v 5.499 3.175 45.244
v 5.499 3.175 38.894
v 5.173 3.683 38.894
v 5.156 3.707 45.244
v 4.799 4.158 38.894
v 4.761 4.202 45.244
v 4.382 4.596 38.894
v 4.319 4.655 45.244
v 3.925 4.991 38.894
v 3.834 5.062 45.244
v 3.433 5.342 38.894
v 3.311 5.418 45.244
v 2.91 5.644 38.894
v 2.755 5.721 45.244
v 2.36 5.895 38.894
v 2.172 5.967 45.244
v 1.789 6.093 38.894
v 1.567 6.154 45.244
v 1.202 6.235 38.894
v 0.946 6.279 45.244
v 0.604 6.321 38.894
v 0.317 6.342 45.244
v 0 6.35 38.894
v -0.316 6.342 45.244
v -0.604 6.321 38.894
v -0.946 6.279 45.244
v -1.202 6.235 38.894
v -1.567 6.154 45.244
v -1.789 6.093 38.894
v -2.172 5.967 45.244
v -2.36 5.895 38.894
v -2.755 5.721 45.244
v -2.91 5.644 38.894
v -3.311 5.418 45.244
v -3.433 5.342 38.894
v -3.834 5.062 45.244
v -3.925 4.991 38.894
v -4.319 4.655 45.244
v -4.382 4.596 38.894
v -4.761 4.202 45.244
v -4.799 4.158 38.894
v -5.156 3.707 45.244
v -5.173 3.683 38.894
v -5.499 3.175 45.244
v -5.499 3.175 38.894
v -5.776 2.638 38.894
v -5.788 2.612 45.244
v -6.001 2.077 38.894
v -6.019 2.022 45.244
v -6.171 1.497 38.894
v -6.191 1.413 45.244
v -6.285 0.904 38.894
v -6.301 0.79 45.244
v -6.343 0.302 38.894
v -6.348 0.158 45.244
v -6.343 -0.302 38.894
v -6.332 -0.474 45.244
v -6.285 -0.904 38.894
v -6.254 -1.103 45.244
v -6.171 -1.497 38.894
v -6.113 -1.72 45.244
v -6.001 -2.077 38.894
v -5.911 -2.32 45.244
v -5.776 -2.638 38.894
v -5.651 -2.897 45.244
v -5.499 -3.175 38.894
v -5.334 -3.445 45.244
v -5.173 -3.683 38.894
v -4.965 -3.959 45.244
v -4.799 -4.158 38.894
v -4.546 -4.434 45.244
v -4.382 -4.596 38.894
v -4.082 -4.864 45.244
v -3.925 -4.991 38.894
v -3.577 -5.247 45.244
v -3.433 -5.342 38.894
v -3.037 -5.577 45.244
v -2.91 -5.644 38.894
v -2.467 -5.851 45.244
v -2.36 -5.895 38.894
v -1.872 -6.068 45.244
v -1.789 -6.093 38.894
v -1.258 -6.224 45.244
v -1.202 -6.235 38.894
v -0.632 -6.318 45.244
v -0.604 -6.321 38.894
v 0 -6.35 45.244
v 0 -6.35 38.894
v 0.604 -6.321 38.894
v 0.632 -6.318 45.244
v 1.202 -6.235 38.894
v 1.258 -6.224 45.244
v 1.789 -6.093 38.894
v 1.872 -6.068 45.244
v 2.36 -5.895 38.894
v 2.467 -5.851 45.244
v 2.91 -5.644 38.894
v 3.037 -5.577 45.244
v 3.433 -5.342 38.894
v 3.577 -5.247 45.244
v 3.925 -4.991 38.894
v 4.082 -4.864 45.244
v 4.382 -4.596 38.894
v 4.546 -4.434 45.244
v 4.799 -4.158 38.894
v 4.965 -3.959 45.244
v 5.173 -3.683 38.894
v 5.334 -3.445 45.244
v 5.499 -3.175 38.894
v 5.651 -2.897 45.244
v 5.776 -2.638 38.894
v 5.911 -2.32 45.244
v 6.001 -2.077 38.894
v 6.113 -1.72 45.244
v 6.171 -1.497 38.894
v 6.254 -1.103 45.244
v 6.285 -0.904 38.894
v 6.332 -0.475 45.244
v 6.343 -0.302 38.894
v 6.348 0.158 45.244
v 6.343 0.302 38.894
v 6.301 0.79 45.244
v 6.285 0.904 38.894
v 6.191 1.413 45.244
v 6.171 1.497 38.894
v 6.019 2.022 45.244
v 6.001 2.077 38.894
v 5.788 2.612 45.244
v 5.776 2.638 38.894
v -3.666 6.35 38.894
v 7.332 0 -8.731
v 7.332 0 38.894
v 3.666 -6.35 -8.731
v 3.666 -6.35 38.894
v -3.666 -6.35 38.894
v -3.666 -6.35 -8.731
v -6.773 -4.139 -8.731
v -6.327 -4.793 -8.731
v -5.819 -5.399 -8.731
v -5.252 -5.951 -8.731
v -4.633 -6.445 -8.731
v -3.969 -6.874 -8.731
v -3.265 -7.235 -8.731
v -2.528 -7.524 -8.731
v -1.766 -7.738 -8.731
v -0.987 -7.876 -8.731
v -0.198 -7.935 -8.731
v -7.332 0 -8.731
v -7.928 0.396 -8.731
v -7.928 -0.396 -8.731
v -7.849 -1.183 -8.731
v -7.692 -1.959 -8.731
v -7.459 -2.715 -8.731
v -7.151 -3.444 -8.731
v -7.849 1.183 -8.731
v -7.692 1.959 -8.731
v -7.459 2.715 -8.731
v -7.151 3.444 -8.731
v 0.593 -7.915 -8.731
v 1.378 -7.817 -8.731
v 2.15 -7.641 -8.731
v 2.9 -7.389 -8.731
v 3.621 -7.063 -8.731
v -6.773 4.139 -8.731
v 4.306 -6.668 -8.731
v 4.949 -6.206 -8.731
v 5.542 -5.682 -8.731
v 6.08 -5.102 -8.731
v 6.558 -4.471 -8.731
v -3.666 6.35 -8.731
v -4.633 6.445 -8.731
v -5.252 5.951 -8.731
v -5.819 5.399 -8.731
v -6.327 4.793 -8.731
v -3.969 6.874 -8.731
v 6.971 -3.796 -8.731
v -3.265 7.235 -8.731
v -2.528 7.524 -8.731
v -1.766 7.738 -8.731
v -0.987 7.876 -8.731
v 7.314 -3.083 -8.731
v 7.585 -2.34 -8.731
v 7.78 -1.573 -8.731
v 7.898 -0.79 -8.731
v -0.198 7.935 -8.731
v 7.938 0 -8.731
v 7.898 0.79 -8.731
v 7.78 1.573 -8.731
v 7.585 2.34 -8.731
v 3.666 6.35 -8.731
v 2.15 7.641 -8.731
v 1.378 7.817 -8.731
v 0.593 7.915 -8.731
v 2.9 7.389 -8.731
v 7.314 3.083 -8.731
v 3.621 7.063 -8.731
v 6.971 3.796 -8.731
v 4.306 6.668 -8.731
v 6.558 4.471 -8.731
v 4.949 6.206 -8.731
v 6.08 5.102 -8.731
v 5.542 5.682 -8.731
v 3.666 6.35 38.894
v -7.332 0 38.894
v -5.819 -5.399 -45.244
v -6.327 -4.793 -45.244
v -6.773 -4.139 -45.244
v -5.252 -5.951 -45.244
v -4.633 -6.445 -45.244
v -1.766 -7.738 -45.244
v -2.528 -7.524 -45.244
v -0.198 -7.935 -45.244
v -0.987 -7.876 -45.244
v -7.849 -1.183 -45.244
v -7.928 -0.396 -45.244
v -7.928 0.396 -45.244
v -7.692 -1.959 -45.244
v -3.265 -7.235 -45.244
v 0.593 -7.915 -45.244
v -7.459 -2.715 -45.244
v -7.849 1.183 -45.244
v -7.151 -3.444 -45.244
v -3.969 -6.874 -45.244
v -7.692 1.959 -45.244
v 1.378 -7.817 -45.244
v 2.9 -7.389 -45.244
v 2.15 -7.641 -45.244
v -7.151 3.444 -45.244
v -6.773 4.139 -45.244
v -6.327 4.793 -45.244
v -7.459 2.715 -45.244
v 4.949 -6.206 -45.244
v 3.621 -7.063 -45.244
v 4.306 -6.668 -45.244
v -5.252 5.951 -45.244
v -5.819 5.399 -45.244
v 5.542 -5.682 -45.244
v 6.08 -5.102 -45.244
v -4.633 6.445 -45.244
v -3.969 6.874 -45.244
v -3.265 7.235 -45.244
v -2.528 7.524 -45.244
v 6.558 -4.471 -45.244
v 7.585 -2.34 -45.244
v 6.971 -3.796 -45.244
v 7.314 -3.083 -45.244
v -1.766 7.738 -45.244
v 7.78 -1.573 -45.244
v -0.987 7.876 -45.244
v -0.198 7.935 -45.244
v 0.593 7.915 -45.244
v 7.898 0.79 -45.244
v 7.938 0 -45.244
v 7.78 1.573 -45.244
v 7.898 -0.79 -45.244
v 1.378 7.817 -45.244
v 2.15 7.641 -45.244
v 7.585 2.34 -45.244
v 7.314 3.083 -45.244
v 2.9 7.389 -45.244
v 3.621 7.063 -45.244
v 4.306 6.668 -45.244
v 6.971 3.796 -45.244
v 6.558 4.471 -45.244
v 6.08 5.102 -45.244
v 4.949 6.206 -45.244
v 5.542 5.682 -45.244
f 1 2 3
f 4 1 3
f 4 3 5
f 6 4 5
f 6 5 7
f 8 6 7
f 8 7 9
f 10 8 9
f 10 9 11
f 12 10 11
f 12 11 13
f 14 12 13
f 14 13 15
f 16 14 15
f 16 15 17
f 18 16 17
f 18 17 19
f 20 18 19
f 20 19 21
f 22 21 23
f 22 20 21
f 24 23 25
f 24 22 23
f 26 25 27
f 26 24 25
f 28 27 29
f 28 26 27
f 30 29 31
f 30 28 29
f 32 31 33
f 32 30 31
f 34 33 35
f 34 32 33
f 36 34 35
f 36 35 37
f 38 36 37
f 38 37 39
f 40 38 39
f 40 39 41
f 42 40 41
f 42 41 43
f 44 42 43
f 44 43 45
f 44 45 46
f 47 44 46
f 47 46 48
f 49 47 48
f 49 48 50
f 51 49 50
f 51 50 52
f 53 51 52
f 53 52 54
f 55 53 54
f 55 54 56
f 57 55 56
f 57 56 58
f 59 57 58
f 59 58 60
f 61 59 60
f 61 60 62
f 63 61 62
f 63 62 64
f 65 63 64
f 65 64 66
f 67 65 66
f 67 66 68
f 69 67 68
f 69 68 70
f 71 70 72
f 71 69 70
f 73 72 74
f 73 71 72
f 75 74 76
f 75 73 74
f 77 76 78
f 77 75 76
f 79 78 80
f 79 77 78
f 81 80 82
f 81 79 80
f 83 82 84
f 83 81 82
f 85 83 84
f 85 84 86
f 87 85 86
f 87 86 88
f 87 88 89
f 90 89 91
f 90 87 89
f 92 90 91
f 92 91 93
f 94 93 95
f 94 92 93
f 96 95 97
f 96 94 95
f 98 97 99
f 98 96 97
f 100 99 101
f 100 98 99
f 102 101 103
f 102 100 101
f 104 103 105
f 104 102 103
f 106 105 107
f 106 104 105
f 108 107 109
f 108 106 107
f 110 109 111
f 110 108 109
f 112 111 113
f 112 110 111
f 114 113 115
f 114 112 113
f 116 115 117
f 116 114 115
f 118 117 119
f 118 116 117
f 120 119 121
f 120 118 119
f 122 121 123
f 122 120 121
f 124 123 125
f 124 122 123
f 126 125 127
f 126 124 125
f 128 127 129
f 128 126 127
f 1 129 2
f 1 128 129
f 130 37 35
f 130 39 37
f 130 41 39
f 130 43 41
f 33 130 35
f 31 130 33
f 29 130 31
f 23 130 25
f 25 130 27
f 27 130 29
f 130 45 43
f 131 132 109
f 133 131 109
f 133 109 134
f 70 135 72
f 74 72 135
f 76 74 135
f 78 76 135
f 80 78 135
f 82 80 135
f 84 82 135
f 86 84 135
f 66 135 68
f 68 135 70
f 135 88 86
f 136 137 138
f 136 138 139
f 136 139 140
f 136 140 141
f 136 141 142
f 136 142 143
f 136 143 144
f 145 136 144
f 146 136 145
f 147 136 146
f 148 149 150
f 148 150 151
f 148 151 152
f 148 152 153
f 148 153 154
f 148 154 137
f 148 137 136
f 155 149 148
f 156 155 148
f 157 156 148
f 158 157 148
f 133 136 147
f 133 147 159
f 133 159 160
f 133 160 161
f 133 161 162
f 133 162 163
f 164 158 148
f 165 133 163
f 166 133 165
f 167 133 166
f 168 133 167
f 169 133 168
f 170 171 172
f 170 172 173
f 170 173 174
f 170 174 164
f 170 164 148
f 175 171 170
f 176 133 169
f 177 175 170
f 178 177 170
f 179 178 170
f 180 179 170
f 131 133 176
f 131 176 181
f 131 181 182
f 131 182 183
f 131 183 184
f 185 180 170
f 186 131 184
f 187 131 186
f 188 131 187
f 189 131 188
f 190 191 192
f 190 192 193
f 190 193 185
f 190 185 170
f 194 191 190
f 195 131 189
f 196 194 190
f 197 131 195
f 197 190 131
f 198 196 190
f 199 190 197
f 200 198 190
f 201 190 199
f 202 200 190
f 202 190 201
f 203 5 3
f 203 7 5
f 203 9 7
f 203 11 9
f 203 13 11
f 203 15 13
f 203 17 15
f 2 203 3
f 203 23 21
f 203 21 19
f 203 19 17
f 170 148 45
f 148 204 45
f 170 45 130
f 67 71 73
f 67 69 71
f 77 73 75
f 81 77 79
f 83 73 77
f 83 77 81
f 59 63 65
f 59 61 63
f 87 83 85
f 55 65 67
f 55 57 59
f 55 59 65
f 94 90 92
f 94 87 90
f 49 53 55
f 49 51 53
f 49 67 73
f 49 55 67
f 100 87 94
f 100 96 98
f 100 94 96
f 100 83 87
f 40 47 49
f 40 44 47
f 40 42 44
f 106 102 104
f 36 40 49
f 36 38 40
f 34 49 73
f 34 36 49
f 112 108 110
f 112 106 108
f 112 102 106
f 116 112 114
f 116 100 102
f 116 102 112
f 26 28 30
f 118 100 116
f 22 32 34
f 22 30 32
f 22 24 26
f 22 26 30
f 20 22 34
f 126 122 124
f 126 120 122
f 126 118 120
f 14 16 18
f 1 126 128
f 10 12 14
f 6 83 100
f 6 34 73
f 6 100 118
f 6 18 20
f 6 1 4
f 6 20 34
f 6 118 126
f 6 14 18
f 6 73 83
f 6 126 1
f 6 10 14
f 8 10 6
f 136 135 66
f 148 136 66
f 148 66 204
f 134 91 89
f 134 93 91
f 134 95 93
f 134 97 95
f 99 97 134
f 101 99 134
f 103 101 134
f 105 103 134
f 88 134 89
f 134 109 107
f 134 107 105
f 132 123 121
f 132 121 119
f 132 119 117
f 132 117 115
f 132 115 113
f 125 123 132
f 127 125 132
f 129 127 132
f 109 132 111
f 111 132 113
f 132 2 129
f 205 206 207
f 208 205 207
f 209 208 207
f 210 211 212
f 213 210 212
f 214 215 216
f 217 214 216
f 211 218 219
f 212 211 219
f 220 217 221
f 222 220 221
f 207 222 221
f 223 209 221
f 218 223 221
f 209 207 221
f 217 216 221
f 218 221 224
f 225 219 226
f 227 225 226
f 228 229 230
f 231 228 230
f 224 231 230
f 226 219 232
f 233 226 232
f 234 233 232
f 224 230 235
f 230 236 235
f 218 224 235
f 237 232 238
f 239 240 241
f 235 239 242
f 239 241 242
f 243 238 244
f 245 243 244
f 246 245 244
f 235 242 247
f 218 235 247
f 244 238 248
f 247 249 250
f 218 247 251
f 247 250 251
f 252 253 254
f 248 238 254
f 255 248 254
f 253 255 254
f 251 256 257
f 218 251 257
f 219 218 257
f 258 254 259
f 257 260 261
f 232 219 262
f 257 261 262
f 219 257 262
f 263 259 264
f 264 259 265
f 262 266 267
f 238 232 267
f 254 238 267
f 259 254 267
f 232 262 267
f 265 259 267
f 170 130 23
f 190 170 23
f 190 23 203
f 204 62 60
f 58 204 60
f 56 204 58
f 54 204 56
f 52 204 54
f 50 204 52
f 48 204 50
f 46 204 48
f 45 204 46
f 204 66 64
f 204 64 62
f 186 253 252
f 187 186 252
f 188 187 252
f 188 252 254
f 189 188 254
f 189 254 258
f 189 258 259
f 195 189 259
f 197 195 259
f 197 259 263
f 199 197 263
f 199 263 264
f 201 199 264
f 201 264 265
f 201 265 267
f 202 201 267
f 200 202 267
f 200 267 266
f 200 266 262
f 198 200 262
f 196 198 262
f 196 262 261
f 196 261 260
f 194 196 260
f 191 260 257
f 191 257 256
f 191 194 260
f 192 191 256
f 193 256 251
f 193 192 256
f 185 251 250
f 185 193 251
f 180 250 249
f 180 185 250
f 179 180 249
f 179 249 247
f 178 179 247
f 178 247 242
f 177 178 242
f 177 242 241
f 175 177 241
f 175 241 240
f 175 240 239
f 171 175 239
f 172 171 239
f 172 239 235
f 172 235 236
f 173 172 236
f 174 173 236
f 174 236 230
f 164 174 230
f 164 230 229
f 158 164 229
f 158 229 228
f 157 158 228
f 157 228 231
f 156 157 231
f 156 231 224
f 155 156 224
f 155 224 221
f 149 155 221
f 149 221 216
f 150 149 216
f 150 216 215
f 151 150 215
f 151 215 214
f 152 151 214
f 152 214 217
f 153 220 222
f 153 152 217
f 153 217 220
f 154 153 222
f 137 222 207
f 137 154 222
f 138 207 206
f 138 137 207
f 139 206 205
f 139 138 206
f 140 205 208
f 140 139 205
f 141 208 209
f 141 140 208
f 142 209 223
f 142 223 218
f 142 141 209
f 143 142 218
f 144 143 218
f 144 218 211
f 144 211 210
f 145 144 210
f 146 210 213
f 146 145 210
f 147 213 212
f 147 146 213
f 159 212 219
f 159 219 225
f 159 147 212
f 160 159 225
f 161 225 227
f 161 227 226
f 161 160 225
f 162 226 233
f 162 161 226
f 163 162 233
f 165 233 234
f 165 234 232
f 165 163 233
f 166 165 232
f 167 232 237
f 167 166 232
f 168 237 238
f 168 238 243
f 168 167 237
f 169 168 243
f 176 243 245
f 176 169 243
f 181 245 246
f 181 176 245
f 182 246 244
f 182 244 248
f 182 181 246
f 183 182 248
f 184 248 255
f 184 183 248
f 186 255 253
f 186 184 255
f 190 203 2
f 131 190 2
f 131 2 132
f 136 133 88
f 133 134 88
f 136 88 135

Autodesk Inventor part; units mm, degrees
ref_plane "YZ Plane" through (0, 0, 0) normal (1, 0, 0) x (0, 1, 0)
ref_plane "XZ Plane" through (0, 0, 0) normal (0, 1, 0) x (-1, 0, 0)
ref_plane "XY Plane" through (0, 0, 0) normal (0, 0, 1) x (1, 0, 0)
sketch "Sketch1" plane through (0, 0, 0) normal (0, 0, 1) x (1, 0, 0)
  circle A0 centre (0, 0) radius 7.9375
  dimension "d0" = 15.875
extrude "Extrusion1" add sketch "Sketch1" along normal mid plane 90.4875
sketch "Sketch2" plane through (0, 0, 45.2437) normal (0, 0, 1) x (1, 0, 0)
  line L0 (-3.6662, 6.35) -> (3.6662, 6.35)
  line L1 (3.6662, 6.35) -> (7.3323, 0)
  line L2 (7.3323, 0) -> (3.6662, -6.35)
  line L3 (3.6662, -6.35) -> (-3.6662, -6.35)
  line L4 (-3.6662, -6.35) -> (-7.3323, 0)
  line L5 (-7.3323, 0) -> (-3.6662, 6.35)
  circle A0 centre (0, 0) radius 7.9375 projected
  point P0 (0, -6.35)
  point P1 (0, 6.35)
  dimension "d3" = 12.7
extrude "Extrusion2" cut sketch "Sketch2" against normal blind 53.975
sketch "Sketch3" plane through (0, 0, 45.2437) normal (0, 0, 1) x (1, 0, 0)
  circle A0 centre (0, 0) radius 6.35
  circle A1 centre (0, 0) radius 7.9375 projected
  line L0 (3.6662, 6.35) -> (-3.6662, 6.35) projected
  line L1 (7.3323, 0) -> (3.6662, 6.35) projected
  line L2 (3.6662, -6.35) -> (7.3323, 0) projected
  line L3 (-3.6662, -6.35) -> (3.6662, -6.35) projected
  line L4 (-7.3323, 0) -> (-3.6662, -6.35) projected
  line L5 (-3.6662, 6.35) -> (-7.3323, 0) projected
  point P0 (-5.4993, 3.175)
  point P1 (0, 6.35)
  point P2 (-5.4993, -3.175)
  point P3 (0, -6.35)
  point P4 (5.4993, -3.175)
  point P5 (5.4993, 3.175)
  dimension "d6" = 12.7
extrude "Extrusion3" cut sketch "Sketch3" against normal blind 6.35 contours A0 L1 L2 | A0 L0 L1 | L2 L3 A0 | A0 L5 L0 | L3 L4 A0 | A0 L4 L5
properties part number "EL2-C-007" material "Aluminum 6061"
